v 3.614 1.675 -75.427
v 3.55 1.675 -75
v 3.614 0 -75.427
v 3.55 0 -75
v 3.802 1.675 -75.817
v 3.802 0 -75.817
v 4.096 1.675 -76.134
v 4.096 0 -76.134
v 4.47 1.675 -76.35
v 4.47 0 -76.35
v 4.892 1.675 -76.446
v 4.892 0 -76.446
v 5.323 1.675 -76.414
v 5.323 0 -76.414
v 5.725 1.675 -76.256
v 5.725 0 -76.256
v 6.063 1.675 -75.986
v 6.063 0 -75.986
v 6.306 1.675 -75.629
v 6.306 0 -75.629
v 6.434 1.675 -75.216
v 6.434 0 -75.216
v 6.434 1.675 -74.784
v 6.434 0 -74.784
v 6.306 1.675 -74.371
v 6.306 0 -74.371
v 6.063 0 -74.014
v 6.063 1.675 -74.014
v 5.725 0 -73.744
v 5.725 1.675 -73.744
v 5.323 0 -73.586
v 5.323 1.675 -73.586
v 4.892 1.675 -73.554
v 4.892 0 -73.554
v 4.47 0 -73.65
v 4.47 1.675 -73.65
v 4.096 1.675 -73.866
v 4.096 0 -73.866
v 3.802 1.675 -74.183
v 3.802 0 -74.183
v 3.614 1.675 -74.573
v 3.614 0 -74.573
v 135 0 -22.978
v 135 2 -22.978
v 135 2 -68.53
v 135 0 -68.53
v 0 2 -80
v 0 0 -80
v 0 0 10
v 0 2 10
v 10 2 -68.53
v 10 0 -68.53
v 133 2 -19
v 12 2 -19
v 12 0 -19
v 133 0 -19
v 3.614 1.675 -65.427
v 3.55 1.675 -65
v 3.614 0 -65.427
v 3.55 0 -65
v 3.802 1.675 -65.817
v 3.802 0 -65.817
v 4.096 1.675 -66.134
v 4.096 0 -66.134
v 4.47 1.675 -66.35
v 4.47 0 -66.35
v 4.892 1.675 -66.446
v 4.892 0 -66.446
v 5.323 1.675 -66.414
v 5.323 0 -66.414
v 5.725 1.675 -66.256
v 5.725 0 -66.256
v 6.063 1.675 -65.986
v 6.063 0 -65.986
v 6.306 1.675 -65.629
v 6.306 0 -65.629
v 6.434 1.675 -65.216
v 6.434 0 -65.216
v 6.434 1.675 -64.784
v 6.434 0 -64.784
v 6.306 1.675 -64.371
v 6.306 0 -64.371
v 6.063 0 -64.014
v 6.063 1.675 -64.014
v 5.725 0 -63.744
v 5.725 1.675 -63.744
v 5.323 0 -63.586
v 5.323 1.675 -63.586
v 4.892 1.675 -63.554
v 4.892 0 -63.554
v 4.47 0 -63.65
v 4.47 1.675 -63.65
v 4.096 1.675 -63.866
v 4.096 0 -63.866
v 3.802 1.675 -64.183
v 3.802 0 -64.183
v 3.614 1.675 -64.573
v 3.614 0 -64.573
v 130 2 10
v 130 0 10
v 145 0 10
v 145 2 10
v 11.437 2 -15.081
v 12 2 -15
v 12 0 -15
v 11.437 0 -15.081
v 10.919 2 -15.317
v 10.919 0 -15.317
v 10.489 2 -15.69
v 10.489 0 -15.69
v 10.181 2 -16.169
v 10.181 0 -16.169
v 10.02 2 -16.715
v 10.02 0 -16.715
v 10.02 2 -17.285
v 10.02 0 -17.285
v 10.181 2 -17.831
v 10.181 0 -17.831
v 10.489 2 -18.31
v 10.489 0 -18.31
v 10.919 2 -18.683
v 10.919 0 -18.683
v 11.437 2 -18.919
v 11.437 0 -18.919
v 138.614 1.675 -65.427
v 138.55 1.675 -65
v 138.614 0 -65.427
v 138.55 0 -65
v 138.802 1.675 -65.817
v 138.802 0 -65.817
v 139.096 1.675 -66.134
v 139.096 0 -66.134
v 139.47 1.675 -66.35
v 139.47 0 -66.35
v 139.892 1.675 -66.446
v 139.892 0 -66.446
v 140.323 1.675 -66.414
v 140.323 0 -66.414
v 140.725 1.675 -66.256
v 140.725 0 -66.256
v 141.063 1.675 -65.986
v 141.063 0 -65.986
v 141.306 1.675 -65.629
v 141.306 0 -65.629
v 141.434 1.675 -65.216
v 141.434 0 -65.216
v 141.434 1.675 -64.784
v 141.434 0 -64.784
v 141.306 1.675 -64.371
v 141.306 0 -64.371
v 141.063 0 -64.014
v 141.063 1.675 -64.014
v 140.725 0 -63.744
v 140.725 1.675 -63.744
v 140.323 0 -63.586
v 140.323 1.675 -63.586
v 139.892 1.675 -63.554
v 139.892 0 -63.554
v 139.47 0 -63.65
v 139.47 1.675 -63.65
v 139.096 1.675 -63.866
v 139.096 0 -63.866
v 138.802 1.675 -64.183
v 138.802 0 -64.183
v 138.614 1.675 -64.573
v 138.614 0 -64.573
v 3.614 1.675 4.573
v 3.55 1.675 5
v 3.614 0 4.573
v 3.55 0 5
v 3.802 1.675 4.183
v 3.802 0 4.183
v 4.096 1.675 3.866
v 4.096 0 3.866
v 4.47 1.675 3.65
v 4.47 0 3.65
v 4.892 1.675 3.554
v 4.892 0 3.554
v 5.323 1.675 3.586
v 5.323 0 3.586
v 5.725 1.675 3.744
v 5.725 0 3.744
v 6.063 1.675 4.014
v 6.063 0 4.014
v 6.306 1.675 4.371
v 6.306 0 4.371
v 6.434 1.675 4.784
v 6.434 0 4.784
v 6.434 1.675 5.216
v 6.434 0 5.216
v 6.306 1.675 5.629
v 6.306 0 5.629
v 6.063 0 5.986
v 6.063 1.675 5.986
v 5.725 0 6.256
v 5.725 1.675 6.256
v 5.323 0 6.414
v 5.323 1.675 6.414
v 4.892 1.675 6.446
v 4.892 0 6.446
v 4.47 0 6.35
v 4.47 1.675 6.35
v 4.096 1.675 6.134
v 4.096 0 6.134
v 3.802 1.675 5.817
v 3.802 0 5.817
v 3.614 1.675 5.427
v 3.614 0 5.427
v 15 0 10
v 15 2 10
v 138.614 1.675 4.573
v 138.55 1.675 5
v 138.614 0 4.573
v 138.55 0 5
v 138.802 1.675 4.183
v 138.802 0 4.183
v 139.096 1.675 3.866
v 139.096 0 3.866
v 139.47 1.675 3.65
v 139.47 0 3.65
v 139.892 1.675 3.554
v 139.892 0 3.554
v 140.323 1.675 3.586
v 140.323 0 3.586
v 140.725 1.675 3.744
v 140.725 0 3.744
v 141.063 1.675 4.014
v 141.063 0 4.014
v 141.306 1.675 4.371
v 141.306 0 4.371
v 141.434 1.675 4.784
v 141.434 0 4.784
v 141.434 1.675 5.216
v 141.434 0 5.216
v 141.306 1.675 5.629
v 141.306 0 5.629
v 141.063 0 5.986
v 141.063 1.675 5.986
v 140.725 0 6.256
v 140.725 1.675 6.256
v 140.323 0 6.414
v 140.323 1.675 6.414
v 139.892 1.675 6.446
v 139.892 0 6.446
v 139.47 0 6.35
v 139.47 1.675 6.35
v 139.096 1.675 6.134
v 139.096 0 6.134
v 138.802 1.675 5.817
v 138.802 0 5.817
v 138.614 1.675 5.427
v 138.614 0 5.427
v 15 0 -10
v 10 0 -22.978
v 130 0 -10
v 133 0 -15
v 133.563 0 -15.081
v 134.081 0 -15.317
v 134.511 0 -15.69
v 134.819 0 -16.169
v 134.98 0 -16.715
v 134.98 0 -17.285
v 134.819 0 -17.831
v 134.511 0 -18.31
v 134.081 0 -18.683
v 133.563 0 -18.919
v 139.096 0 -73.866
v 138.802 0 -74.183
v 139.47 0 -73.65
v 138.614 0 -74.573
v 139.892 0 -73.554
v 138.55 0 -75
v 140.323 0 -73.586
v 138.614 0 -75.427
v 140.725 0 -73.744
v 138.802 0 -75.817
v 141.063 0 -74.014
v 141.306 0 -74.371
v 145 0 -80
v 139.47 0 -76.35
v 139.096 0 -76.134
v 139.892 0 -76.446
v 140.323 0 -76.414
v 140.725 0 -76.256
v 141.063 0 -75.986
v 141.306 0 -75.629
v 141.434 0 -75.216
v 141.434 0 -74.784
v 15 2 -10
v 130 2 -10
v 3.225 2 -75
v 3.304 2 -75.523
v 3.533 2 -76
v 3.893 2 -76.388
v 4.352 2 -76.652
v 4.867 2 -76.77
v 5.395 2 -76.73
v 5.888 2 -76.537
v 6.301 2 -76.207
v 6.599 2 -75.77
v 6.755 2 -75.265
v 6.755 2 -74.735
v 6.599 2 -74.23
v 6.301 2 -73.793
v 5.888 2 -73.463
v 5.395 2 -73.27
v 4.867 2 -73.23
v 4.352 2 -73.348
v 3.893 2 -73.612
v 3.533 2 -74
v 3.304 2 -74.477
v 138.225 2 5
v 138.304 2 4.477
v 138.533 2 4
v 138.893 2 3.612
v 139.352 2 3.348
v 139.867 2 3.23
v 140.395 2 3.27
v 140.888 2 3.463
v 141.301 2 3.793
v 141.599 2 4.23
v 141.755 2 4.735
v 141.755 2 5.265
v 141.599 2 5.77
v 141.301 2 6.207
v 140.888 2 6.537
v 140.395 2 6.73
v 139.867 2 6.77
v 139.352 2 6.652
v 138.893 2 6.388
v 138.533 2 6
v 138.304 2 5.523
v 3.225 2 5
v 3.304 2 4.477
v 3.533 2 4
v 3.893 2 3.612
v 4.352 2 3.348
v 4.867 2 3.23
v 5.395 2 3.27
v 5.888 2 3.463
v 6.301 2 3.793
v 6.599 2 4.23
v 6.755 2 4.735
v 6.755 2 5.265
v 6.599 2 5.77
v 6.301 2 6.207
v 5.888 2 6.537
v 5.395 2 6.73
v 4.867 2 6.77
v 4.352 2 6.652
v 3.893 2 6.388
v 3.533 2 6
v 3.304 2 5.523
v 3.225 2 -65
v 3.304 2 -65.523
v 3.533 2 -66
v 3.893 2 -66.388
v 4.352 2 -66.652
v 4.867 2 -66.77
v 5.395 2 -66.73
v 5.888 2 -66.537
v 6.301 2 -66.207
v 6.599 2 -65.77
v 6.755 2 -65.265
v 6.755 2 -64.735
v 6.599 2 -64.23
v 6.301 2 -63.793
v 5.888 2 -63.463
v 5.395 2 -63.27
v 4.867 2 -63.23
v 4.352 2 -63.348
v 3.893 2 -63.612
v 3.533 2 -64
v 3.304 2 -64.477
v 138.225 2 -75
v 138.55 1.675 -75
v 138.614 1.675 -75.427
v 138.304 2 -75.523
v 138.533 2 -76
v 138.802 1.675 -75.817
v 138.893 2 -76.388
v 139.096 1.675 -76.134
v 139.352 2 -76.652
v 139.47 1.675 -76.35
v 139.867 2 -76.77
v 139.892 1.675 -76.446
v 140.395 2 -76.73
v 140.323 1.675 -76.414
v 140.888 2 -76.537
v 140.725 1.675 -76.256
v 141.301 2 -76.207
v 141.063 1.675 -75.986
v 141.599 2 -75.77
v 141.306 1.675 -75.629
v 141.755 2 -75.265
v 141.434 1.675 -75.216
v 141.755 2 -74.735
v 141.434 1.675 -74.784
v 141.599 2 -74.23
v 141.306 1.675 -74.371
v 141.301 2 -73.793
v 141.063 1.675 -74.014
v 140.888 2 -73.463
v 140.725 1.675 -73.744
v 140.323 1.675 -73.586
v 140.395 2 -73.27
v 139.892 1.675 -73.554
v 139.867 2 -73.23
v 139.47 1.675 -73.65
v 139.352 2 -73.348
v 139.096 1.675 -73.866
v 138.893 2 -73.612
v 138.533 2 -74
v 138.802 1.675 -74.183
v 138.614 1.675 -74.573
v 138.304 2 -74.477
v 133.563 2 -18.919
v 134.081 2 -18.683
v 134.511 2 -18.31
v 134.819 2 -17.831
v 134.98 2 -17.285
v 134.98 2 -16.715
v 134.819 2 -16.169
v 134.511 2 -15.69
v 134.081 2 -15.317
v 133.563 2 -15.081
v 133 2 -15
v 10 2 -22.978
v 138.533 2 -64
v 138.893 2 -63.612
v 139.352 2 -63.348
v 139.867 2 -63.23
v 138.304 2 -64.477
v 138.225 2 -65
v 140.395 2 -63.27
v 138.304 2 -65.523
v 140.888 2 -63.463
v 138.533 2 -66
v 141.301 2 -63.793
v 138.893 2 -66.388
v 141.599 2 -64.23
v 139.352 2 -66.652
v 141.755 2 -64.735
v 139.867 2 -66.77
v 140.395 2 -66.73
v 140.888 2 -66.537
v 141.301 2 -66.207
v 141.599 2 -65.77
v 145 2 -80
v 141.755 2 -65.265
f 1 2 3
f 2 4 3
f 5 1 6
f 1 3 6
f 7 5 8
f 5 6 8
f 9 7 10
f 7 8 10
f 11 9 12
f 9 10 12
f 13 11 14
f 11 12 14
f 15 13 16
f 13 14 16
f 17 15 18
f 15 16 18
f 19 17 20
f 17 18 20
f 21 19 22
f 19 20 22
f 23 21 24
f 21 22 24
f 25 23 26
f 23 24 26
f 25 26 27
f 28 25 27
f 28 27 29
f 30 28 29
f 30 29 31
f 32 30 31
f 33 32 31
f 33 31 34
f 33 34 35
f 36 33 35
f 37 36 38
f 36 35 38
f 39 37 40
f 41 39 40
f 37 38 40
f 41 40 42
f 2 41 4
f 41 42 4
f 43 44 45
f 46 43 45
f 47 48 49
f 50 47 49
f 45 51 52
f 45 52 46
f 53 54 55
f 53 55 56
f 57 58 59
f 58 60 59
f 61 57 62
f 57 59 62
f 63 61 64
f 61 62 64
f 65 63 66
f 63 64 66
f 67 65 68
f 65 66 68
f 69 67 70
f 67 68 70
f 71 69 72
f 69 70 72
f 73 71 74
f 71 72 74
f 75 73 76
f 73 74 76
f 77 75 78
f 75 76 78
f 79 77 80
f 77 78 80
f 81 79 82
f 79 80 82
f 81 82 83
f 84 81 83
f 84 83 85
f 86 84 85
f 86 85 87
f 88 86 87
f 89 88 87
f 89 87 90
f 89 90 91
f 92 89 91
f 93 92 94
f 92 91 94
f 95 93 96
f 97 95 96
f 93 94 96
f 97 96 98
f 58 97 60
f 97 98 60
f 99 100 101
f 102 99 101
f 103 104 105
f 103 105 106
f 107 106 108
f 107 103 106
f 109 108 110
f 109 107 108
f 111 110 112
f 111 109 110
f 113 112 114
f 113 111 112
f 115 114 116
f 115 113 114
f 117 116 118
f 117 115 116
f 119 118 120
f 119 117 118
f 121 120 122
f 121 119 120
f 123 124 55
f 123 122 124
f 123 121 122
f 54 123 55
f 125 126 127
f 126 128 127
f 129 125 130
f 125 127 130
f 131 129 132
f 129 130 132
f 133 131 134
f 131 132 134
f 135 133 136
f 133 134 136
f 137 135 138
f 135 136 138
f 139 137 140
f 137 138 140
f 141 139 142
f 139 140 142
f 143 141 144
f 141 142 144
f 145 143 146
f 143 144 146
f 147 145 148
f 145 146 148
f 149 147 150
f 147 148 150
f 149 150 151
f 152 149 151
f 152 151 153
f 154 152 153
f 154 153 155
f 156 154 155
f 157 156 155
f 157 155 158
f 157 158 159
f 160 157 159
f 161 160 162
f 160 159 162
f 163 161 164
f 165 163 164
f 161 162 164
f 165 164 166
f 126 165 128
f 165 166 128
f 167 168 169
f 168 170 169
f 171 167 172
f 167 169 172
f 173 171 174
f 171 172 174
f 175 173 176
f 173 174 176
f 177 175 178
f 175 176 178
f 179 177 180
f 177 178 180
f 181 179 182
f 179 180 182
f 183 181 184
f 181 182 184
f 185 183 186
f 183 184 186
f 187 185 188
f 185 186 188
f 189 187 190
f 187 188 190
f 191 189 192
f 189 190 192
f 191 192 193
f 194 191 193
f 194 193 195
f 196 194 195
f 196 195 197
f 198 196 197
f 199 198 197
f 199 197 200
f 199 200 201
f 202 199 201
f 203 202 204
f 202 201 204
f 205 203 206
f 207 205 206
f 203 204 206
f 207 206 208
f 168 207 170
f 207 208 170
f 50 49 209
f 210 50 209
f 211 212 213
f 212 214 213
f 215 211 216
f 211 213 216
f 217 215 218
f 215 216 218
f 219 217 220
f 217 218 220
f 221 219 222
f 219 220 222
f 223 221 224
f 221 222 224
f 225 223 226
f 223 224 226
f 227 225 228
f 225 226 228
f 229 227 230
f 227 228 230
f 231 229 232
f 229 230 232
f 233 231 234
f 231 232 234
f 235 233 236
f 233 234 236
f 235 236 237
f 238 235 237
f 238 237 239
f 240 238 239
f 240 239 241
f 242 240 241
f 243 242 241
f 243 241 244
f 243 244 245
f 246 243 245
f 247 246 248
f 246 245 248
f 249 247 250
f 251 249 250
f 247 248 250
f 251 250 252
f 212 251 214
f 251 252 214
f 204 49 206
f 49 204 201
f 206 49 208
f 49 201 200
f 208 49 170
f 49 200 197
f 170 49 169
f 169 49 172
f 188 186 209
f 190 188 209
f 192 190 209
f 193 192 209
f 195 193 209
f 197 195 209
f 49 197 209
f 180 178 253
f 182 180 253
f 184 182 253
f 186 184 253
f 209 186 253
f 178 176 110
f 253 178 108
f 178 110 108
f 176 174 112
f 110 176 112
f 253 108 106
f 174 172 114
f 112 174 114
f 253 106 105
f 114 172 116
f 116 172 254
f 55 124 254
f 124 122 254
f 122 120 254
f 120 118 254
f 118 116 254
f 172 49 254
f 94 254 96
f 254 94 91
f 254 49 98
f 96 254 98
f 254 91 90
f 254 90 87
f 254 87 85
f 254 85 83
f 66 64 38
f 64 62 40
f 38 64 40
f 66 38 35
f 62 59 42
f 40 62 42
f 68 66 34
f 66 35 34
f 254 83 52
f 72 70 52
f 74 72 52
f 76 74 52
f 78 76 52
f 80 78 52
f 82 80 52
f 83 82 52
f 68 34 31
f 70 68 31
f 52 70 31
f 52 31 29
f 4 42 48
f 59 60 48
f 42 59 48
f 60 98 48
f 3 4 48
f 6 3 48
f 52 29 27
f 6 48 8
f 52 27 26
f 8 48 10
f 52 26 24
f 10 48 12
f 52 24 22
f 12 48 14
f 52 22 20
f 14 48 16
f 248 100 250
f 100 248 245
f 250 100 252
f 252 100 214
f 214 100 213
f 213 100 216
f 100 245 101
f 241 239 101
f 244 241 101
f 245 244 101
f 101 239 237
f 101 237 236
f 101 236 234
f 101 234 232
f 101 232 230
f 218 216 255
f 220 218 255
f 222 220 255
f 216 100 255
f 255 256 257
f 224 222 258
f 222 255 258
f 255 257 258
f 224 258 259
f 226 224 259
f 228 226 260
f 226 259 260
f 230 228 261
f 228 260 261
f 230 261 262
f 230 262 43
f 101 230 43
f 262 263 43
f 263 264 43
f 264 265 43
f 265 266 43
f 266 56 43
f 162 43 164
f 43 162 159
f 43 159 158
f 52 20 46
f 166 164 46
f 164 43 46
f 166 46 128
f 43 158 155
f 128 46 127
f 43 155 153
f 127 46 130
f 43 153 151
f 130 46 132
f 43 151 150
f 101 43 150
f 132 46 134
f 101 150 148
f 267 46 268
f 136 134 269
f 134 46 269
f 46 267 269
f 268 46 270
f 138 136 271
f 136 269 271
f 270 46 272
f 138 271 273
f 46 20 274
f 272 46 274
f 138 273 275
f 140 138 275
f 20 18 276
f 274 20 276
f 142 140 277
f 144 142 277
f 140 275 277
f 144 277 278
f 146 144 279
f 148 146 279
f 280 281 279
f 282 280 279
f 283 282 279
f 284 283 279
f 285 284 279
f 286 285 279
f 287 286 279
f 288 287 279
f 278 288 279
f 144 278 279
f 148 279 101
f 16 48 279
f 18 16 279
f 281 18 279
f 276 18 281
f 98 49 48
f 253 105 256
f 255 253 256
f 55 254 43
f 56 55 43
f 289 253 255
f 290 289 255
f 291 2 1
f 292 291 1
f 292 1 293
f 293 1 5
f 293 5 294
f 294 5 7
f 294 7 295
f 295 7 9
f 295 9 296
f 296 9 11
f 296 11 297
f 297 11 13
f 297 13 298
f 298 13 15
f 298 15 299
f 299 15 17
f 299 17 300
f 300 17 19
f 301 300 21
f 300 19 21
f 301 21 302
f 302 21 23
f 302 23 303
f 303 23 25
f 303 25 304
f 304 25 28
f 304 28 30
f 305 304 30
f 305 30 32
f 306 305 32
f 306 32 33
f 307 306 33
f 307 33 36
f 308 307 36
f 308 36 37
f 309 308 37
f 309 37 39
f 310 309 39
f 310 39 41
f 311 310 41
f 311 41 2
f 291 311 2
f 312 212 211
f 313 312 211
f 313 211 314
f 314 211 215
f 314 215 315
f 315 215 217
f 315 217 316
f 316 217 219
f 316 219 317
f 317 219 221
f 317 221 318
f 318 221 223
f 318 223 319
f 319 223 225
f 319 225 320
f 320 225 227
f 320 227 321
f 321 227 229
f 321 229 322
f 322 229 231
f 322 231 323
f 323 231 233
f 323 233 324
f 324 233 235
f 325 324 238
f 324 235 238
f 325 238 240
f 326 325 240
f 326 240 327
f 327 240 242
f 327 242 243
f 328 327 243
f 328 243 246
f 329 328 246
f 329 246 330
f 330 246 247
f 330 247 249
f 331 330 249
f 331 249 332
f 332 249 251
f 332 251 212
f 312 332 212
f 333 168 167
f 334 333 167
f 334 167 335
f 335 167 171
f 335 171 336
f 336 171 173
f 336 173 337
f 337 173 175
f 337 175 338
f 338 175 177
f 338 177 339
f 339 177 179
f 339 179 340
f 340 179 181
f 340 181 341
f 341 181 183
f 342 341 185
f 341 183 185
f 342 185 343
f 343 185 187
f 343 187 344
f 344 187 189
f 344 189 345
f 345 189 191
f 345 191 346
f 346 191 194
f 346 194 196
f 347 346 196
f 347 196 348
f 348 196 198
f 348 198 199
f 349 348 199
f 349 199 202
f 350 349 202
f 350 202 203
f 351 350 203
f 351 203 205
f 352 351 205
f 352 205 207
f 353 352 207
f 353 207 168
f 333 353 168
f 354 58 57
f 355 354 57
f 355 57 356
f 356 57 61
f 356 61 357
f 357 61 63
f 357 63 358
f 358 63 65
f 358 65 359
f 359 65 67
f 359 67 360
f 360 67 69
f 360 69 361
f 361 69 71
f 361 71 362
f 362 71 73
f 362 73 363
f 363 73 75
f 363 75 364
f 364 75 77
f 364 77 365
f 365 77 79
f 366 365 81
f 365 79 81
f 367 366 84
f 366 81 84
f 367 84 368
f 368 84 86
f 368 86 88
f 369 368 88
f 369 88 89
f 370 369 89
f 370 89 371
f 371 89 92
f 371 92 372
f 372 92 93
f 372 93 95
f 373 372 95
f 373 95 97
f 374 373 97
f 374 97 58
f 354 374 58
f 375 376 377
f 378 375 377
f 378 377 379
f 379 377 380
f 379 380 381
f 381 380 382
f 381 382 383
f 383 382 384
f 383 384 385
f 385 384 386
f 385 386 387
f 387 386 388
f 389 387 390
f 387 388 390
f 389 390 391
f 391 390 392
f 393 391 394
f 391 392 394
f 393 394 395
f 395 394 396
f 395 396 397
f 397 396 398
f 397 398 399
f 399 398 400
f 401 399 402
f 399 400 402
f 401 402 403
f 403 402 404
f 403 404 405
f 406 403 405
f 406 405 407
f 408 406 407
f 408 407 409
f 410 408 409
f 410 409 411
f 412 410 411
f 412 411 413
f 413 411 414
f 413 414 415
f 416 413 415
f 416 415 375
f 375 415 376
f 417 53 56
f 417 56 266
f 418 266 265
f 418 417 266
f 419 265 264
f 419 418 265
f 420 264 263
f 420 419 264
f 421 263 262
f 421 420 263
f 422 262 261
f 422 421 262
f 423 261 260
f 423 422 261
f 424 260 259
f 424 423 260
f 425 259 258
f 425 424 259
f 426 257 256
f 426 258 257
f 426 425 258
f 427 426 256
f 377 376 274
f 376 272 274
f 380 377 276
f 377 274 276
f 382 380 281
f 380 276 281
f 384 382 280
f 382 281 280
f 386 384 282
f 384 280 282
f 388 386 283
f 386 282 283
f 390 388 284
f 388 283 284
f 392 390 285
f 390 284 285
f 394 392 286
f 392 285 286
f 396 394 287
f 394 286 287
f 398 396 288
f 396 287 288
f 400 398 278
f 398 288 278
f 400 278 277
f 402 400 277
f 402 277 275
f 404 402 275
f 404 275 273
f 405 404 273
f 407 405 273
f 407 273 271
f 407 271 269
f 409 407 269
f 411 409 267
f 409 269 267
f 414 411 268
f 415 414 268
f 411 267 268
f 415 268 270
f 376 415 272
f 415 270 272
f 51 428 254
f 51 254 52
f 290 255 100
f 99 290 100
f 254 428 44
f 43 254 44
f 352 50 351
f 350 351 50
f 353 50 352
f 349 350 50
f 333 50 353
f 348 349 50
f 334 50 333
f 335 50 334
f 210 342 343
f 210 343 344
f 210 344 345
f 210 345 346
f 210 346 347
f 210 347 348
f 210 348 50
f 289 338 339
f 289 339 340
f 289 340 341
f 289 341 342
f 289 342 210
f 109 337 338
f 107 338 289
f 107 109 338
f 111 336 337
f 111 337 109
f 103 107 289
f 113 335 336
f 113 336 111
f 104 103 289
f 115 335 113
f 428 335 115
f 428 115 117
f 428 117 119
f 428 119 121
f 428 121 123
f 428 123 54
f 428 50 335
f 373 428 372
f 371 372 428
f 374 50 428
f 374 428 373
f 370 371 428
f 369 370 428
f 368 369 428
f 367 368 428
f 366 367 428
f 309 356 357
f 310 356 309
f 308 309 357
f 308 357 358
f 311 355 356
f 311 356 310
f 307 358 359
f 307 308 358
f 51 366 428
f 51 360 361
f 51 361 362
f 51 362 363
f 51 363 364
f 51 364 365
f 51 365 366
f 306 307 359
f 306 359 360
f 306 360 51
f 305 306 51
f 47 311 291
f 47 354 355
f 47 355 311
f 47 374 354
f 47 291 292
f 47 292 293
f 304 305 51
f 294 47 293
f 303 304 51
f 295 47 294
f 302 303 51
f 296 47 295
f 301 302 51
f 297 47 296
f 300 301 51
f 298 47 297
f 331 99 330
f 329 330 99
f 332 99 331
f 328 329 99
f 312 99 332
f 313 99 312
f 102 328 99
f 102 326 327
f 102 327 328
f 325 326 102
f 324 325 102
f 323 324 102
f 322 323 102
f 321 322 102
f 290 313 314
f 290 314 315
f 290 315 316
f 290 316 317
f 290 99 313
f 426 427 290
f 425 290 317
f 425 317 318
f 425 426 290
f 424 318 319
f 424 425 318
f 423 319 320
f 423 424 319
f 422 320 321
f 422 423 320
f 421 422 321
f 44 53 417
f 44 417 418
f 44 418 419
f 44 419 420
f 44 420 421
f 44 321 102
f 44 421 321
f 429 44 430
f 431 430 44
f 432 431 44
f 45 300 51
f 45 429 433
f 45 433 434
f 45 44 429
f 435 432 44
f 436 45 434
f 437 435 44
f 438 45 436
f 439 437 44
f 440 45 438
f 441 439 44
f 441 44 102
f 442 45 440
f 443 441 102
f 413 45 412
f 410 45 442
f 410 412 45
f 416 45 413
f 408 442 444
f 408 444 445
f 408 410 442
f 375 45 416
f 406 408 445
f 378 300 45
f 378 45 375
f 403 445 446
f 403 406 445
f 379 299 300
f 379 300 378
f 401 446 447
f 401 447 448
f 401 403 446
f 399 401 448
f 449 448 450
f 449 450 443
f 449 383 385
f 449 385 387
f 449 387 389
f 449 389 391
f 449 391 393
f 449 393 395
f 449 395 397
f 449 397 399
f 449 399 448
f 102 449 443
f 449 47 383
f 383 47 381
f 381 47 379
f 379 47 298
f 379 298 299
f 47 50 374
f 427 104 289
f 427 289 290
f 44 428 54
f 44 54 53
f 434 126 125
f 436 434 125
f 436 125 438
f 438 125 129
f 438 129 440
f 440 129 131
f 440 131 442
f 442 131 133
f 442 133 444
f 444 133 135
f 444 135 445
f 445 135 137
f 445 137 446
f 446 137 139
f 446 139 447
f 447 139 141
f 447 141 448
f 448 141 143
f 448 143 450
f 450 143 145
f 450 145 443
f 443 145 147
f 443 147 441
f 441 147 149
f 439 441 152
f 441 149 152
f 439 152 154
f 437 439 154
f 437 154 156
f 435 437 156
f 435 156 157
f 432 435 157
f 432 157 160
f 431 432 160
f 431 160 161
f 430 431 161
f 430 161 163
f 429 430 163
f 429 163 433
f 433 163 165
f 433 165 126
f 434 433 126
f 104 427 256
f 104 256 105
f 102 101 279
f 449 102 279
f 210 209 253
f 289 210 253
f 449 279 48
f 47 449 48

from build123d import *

# Parameters (mm, degrees)
EXTRUDE_1_DEPTH                = 2
HOLE_WIZARD_M3_5_2_D           = 2.9
HOLE_WIZARD_M3_5_2_CSINK_D     = 3.55
HOLE_WIZARD_M3_5_2_CSINK_ANGLE = 90
CUT_EXTRUDE_1_DEPTH            = 3
SKETCH_7_W                     = 125
SKETCH_7_H                     = 45.551843708
CUT_EXTRUDE_2_DEPTH            = 3


with BuildPart() as part:
    # 草图1 → 凸台-拉伸1 (new body)
    with BuildSketch(Plane(origin=(0, 0, 0), x_dir=(1, 0, 0), z_dir=(0, 1, 0))):
        Polygon((0, 0), (0, -10), (15, -10), (15, 0), (15, 10), (130, 10), (130, 0), (130, -10), (145, -10), (145, 0), (145, 80), (0, 80), align=None)
    extrude(amount=EXTRUDE_1_DEPTH)

    # M3.5 螺纹孔2 (through all)
    with Locations(Plane(origin=(0, 2, 0), x_dir=(1, 0, 0), z_dir=(0, 1, 0))):
        with Locations((5, 65), (5, 75), (140, 75), (140, -5), (5, -5), (140, 65)):
            CounterSinkHole(HOLE_WIZARD_M3_5_2_D / 2, HOLE_WIZARD_M3_5_2_CSINK_D / 2, counter_sink_angle=HOLE_WIZARD_M3_5_2_CSINK_ANGLE)

    # 草图6 → 切除-拉伸1 (cut)
    with BuildSketch(Plane(origin=(0, 2, 0), x_dir=(1, 0, 0), z_dir=(0, 1, 0))):
        with BuildLine():
            Line((12, 19), (133, 19))
            ThreePointArc((133, 19), (135, 17), (133, 15))
            Line((133, 15), (12, 15))
            ThreePointArc((12, 15), (10, 17), (12, 19))
        make_face()
    extrude(amount=-CUT_EXTRUDE_1_DEPTH, mode=Mode.SUBTRACT)

    # 草图7 → 切除-拉伸2 (cut)
    with BuildSketch(Plane(origin=(0, 2, 0), x_dir=(1, 0, 0), z_dir=(0, 1, 0))):
        with Locations((72.5, 45.7539171)):
            Rectangle(SKETCH_7_W, SKETCH_7_H)
    extrude(amount=-CUT_EXTRUDE_2_DEPTH, mode=Mode.SUBTRACT)


solid = part.part
